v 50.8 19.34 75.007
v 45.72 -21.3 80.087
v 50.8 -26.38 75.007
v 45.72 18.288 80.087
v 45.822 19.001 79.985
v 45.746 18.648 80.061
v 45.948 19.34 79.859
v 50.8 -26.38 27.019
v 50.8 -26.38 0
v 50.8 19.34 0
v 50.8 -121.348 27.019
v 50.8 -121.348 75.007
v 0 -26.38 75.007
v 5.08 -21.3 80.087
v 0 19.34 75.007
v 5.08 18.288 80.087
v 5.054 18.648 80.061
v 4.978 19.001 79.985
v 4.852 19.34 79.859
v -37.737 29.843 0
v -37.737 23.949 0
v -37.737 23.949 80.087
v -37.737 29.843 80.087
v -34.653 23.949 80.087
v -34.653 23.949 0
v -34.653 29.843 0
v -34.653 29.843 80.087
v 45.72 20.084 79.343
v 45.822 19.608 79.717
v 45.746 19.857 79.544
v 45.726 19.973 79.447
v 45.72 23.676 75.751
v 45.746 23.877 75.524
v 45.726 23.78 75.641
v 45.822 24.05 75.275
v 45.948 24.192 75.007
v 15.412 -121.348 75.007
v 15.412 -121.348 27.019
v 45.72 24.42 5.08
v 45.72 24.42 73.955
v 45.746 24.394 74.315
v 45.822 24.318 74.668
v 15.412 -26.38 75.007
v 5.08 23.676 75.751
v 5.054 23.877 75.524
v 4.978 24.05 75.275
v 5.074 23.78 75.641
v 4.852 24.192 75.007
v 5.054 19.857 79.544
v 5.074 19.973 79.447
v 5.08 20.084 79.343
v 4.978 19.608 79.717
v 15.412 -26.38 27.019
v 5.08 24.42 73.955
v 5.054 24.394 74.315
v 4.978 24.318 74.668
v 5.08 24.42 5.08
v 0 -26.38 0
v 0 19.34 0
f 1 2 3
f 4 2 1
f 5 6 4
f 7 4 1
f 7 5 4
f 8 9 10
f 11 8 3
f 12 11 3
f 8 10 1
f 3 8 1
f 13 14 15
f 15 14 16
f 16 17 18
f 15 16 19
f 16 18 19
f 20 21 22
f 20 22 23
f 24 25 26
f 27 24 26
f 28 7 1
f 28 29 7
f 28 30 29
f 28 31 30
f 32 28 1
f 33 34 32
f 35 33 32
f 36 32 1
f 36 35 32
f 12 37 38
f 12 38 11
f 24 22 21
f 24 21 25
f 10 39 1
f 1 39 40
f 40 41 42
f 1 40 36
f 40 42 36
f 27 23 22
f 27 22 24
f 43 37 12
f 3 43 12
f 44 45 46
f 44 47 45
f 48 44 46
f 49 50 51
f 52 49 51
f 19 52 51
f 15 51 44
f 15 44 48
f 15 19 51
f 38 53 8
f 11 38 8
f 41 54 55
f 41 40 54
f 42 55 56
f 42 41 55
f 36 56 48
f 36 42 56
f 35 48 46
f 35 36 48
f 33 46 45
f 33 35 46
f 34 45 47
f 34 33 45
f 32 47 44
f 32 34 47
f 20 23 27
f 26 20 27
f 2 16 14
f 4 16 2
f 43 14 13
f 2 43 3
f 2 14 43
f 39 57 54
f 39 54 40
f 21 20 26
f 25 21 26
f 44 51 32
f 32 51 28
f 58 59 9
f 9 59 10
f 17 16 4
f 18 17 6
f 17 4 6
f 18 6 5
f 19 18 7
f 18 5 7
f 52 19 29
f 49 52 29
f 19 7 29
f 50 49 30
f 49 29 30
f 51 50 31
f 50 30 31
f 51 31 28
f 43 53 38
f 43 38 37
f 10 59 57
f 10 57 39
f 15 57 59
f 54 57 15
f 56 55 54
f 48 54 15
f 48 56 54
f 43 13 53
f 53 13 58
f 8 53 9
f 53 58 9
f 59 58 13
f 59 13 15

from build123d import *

# Parameters (mm, degrees)
F0_W     = 3.0842895067
F0_H     = 5.8946473162
F1_DEPTH = 80.0870582461
F0_W_2   = 50.8
F0_H_2   = 50.8
F2_SIZE  = 5.08
F3_R     = 2.54
F6_W     = 35.3883287489
F6_H     = 47.9876469207
F7_DEPTH = 94.9677098542


# Not quite as in the source:
# - the program builds the solid bodies; features that only make, move or delete a surface that nothing else refers to are left out


with BuildPart() as f1:
    # F0 (on Top) → F1 (new body)
    with BuildSketch(Plane.XY):
        with Locations((-36.1949966816, 26.8958949286)):
            Rectangle(F0_W, F0_H)
    extrude(amount=F1_DEPTH)


with BuildPart() as f1b:
    # F0 (on Top) → F1, piece 2 (new body)
    with BuildSketch(Plane.XY):
        with Locations((25.4, -0.9800925486)):
            Rectangle(F0_W_2, F0_H_2)
    extrude(amount=F1_DEPTH)

    # F2
    f2_edges = [f1b.edges().sort_by_distance(p)[0] for p in [
        (25.4, -26.380093, 80.087058),
        (0, -0.980093, 80.087058),
        (25.4, 24.419907, 80.087058),
        (50.8, -0.980093, 80.087058),
        (0, 24.419907, 40.043529),
        (25.4, 24.419907, 0),
        (50.8, 24.419907, 40.043529),
    ]]
    chamfer(f2_edges, length=F2_SIZE)

    # F3
    f3_edges = [f1b.edges().sort_by_distance(p)[0] for p in [
        (25.4, 19.339907, 80.087058),
        (25.4, 24.419907, 75.007058),
    ]]
    fillet(f3_edges, radius=F3_R)

    # F6 (on face) → F7 (join)
    with BuildSketch(Plane.XZ.offset(26.3800925486)):
        with Locations((33.1058356255, 51.0132347858)):
            Rectangle(F6_W, F6_H)
    extrude(amount=F7_DEPTH)


solid = Compound([f1.part, f1b.part])
